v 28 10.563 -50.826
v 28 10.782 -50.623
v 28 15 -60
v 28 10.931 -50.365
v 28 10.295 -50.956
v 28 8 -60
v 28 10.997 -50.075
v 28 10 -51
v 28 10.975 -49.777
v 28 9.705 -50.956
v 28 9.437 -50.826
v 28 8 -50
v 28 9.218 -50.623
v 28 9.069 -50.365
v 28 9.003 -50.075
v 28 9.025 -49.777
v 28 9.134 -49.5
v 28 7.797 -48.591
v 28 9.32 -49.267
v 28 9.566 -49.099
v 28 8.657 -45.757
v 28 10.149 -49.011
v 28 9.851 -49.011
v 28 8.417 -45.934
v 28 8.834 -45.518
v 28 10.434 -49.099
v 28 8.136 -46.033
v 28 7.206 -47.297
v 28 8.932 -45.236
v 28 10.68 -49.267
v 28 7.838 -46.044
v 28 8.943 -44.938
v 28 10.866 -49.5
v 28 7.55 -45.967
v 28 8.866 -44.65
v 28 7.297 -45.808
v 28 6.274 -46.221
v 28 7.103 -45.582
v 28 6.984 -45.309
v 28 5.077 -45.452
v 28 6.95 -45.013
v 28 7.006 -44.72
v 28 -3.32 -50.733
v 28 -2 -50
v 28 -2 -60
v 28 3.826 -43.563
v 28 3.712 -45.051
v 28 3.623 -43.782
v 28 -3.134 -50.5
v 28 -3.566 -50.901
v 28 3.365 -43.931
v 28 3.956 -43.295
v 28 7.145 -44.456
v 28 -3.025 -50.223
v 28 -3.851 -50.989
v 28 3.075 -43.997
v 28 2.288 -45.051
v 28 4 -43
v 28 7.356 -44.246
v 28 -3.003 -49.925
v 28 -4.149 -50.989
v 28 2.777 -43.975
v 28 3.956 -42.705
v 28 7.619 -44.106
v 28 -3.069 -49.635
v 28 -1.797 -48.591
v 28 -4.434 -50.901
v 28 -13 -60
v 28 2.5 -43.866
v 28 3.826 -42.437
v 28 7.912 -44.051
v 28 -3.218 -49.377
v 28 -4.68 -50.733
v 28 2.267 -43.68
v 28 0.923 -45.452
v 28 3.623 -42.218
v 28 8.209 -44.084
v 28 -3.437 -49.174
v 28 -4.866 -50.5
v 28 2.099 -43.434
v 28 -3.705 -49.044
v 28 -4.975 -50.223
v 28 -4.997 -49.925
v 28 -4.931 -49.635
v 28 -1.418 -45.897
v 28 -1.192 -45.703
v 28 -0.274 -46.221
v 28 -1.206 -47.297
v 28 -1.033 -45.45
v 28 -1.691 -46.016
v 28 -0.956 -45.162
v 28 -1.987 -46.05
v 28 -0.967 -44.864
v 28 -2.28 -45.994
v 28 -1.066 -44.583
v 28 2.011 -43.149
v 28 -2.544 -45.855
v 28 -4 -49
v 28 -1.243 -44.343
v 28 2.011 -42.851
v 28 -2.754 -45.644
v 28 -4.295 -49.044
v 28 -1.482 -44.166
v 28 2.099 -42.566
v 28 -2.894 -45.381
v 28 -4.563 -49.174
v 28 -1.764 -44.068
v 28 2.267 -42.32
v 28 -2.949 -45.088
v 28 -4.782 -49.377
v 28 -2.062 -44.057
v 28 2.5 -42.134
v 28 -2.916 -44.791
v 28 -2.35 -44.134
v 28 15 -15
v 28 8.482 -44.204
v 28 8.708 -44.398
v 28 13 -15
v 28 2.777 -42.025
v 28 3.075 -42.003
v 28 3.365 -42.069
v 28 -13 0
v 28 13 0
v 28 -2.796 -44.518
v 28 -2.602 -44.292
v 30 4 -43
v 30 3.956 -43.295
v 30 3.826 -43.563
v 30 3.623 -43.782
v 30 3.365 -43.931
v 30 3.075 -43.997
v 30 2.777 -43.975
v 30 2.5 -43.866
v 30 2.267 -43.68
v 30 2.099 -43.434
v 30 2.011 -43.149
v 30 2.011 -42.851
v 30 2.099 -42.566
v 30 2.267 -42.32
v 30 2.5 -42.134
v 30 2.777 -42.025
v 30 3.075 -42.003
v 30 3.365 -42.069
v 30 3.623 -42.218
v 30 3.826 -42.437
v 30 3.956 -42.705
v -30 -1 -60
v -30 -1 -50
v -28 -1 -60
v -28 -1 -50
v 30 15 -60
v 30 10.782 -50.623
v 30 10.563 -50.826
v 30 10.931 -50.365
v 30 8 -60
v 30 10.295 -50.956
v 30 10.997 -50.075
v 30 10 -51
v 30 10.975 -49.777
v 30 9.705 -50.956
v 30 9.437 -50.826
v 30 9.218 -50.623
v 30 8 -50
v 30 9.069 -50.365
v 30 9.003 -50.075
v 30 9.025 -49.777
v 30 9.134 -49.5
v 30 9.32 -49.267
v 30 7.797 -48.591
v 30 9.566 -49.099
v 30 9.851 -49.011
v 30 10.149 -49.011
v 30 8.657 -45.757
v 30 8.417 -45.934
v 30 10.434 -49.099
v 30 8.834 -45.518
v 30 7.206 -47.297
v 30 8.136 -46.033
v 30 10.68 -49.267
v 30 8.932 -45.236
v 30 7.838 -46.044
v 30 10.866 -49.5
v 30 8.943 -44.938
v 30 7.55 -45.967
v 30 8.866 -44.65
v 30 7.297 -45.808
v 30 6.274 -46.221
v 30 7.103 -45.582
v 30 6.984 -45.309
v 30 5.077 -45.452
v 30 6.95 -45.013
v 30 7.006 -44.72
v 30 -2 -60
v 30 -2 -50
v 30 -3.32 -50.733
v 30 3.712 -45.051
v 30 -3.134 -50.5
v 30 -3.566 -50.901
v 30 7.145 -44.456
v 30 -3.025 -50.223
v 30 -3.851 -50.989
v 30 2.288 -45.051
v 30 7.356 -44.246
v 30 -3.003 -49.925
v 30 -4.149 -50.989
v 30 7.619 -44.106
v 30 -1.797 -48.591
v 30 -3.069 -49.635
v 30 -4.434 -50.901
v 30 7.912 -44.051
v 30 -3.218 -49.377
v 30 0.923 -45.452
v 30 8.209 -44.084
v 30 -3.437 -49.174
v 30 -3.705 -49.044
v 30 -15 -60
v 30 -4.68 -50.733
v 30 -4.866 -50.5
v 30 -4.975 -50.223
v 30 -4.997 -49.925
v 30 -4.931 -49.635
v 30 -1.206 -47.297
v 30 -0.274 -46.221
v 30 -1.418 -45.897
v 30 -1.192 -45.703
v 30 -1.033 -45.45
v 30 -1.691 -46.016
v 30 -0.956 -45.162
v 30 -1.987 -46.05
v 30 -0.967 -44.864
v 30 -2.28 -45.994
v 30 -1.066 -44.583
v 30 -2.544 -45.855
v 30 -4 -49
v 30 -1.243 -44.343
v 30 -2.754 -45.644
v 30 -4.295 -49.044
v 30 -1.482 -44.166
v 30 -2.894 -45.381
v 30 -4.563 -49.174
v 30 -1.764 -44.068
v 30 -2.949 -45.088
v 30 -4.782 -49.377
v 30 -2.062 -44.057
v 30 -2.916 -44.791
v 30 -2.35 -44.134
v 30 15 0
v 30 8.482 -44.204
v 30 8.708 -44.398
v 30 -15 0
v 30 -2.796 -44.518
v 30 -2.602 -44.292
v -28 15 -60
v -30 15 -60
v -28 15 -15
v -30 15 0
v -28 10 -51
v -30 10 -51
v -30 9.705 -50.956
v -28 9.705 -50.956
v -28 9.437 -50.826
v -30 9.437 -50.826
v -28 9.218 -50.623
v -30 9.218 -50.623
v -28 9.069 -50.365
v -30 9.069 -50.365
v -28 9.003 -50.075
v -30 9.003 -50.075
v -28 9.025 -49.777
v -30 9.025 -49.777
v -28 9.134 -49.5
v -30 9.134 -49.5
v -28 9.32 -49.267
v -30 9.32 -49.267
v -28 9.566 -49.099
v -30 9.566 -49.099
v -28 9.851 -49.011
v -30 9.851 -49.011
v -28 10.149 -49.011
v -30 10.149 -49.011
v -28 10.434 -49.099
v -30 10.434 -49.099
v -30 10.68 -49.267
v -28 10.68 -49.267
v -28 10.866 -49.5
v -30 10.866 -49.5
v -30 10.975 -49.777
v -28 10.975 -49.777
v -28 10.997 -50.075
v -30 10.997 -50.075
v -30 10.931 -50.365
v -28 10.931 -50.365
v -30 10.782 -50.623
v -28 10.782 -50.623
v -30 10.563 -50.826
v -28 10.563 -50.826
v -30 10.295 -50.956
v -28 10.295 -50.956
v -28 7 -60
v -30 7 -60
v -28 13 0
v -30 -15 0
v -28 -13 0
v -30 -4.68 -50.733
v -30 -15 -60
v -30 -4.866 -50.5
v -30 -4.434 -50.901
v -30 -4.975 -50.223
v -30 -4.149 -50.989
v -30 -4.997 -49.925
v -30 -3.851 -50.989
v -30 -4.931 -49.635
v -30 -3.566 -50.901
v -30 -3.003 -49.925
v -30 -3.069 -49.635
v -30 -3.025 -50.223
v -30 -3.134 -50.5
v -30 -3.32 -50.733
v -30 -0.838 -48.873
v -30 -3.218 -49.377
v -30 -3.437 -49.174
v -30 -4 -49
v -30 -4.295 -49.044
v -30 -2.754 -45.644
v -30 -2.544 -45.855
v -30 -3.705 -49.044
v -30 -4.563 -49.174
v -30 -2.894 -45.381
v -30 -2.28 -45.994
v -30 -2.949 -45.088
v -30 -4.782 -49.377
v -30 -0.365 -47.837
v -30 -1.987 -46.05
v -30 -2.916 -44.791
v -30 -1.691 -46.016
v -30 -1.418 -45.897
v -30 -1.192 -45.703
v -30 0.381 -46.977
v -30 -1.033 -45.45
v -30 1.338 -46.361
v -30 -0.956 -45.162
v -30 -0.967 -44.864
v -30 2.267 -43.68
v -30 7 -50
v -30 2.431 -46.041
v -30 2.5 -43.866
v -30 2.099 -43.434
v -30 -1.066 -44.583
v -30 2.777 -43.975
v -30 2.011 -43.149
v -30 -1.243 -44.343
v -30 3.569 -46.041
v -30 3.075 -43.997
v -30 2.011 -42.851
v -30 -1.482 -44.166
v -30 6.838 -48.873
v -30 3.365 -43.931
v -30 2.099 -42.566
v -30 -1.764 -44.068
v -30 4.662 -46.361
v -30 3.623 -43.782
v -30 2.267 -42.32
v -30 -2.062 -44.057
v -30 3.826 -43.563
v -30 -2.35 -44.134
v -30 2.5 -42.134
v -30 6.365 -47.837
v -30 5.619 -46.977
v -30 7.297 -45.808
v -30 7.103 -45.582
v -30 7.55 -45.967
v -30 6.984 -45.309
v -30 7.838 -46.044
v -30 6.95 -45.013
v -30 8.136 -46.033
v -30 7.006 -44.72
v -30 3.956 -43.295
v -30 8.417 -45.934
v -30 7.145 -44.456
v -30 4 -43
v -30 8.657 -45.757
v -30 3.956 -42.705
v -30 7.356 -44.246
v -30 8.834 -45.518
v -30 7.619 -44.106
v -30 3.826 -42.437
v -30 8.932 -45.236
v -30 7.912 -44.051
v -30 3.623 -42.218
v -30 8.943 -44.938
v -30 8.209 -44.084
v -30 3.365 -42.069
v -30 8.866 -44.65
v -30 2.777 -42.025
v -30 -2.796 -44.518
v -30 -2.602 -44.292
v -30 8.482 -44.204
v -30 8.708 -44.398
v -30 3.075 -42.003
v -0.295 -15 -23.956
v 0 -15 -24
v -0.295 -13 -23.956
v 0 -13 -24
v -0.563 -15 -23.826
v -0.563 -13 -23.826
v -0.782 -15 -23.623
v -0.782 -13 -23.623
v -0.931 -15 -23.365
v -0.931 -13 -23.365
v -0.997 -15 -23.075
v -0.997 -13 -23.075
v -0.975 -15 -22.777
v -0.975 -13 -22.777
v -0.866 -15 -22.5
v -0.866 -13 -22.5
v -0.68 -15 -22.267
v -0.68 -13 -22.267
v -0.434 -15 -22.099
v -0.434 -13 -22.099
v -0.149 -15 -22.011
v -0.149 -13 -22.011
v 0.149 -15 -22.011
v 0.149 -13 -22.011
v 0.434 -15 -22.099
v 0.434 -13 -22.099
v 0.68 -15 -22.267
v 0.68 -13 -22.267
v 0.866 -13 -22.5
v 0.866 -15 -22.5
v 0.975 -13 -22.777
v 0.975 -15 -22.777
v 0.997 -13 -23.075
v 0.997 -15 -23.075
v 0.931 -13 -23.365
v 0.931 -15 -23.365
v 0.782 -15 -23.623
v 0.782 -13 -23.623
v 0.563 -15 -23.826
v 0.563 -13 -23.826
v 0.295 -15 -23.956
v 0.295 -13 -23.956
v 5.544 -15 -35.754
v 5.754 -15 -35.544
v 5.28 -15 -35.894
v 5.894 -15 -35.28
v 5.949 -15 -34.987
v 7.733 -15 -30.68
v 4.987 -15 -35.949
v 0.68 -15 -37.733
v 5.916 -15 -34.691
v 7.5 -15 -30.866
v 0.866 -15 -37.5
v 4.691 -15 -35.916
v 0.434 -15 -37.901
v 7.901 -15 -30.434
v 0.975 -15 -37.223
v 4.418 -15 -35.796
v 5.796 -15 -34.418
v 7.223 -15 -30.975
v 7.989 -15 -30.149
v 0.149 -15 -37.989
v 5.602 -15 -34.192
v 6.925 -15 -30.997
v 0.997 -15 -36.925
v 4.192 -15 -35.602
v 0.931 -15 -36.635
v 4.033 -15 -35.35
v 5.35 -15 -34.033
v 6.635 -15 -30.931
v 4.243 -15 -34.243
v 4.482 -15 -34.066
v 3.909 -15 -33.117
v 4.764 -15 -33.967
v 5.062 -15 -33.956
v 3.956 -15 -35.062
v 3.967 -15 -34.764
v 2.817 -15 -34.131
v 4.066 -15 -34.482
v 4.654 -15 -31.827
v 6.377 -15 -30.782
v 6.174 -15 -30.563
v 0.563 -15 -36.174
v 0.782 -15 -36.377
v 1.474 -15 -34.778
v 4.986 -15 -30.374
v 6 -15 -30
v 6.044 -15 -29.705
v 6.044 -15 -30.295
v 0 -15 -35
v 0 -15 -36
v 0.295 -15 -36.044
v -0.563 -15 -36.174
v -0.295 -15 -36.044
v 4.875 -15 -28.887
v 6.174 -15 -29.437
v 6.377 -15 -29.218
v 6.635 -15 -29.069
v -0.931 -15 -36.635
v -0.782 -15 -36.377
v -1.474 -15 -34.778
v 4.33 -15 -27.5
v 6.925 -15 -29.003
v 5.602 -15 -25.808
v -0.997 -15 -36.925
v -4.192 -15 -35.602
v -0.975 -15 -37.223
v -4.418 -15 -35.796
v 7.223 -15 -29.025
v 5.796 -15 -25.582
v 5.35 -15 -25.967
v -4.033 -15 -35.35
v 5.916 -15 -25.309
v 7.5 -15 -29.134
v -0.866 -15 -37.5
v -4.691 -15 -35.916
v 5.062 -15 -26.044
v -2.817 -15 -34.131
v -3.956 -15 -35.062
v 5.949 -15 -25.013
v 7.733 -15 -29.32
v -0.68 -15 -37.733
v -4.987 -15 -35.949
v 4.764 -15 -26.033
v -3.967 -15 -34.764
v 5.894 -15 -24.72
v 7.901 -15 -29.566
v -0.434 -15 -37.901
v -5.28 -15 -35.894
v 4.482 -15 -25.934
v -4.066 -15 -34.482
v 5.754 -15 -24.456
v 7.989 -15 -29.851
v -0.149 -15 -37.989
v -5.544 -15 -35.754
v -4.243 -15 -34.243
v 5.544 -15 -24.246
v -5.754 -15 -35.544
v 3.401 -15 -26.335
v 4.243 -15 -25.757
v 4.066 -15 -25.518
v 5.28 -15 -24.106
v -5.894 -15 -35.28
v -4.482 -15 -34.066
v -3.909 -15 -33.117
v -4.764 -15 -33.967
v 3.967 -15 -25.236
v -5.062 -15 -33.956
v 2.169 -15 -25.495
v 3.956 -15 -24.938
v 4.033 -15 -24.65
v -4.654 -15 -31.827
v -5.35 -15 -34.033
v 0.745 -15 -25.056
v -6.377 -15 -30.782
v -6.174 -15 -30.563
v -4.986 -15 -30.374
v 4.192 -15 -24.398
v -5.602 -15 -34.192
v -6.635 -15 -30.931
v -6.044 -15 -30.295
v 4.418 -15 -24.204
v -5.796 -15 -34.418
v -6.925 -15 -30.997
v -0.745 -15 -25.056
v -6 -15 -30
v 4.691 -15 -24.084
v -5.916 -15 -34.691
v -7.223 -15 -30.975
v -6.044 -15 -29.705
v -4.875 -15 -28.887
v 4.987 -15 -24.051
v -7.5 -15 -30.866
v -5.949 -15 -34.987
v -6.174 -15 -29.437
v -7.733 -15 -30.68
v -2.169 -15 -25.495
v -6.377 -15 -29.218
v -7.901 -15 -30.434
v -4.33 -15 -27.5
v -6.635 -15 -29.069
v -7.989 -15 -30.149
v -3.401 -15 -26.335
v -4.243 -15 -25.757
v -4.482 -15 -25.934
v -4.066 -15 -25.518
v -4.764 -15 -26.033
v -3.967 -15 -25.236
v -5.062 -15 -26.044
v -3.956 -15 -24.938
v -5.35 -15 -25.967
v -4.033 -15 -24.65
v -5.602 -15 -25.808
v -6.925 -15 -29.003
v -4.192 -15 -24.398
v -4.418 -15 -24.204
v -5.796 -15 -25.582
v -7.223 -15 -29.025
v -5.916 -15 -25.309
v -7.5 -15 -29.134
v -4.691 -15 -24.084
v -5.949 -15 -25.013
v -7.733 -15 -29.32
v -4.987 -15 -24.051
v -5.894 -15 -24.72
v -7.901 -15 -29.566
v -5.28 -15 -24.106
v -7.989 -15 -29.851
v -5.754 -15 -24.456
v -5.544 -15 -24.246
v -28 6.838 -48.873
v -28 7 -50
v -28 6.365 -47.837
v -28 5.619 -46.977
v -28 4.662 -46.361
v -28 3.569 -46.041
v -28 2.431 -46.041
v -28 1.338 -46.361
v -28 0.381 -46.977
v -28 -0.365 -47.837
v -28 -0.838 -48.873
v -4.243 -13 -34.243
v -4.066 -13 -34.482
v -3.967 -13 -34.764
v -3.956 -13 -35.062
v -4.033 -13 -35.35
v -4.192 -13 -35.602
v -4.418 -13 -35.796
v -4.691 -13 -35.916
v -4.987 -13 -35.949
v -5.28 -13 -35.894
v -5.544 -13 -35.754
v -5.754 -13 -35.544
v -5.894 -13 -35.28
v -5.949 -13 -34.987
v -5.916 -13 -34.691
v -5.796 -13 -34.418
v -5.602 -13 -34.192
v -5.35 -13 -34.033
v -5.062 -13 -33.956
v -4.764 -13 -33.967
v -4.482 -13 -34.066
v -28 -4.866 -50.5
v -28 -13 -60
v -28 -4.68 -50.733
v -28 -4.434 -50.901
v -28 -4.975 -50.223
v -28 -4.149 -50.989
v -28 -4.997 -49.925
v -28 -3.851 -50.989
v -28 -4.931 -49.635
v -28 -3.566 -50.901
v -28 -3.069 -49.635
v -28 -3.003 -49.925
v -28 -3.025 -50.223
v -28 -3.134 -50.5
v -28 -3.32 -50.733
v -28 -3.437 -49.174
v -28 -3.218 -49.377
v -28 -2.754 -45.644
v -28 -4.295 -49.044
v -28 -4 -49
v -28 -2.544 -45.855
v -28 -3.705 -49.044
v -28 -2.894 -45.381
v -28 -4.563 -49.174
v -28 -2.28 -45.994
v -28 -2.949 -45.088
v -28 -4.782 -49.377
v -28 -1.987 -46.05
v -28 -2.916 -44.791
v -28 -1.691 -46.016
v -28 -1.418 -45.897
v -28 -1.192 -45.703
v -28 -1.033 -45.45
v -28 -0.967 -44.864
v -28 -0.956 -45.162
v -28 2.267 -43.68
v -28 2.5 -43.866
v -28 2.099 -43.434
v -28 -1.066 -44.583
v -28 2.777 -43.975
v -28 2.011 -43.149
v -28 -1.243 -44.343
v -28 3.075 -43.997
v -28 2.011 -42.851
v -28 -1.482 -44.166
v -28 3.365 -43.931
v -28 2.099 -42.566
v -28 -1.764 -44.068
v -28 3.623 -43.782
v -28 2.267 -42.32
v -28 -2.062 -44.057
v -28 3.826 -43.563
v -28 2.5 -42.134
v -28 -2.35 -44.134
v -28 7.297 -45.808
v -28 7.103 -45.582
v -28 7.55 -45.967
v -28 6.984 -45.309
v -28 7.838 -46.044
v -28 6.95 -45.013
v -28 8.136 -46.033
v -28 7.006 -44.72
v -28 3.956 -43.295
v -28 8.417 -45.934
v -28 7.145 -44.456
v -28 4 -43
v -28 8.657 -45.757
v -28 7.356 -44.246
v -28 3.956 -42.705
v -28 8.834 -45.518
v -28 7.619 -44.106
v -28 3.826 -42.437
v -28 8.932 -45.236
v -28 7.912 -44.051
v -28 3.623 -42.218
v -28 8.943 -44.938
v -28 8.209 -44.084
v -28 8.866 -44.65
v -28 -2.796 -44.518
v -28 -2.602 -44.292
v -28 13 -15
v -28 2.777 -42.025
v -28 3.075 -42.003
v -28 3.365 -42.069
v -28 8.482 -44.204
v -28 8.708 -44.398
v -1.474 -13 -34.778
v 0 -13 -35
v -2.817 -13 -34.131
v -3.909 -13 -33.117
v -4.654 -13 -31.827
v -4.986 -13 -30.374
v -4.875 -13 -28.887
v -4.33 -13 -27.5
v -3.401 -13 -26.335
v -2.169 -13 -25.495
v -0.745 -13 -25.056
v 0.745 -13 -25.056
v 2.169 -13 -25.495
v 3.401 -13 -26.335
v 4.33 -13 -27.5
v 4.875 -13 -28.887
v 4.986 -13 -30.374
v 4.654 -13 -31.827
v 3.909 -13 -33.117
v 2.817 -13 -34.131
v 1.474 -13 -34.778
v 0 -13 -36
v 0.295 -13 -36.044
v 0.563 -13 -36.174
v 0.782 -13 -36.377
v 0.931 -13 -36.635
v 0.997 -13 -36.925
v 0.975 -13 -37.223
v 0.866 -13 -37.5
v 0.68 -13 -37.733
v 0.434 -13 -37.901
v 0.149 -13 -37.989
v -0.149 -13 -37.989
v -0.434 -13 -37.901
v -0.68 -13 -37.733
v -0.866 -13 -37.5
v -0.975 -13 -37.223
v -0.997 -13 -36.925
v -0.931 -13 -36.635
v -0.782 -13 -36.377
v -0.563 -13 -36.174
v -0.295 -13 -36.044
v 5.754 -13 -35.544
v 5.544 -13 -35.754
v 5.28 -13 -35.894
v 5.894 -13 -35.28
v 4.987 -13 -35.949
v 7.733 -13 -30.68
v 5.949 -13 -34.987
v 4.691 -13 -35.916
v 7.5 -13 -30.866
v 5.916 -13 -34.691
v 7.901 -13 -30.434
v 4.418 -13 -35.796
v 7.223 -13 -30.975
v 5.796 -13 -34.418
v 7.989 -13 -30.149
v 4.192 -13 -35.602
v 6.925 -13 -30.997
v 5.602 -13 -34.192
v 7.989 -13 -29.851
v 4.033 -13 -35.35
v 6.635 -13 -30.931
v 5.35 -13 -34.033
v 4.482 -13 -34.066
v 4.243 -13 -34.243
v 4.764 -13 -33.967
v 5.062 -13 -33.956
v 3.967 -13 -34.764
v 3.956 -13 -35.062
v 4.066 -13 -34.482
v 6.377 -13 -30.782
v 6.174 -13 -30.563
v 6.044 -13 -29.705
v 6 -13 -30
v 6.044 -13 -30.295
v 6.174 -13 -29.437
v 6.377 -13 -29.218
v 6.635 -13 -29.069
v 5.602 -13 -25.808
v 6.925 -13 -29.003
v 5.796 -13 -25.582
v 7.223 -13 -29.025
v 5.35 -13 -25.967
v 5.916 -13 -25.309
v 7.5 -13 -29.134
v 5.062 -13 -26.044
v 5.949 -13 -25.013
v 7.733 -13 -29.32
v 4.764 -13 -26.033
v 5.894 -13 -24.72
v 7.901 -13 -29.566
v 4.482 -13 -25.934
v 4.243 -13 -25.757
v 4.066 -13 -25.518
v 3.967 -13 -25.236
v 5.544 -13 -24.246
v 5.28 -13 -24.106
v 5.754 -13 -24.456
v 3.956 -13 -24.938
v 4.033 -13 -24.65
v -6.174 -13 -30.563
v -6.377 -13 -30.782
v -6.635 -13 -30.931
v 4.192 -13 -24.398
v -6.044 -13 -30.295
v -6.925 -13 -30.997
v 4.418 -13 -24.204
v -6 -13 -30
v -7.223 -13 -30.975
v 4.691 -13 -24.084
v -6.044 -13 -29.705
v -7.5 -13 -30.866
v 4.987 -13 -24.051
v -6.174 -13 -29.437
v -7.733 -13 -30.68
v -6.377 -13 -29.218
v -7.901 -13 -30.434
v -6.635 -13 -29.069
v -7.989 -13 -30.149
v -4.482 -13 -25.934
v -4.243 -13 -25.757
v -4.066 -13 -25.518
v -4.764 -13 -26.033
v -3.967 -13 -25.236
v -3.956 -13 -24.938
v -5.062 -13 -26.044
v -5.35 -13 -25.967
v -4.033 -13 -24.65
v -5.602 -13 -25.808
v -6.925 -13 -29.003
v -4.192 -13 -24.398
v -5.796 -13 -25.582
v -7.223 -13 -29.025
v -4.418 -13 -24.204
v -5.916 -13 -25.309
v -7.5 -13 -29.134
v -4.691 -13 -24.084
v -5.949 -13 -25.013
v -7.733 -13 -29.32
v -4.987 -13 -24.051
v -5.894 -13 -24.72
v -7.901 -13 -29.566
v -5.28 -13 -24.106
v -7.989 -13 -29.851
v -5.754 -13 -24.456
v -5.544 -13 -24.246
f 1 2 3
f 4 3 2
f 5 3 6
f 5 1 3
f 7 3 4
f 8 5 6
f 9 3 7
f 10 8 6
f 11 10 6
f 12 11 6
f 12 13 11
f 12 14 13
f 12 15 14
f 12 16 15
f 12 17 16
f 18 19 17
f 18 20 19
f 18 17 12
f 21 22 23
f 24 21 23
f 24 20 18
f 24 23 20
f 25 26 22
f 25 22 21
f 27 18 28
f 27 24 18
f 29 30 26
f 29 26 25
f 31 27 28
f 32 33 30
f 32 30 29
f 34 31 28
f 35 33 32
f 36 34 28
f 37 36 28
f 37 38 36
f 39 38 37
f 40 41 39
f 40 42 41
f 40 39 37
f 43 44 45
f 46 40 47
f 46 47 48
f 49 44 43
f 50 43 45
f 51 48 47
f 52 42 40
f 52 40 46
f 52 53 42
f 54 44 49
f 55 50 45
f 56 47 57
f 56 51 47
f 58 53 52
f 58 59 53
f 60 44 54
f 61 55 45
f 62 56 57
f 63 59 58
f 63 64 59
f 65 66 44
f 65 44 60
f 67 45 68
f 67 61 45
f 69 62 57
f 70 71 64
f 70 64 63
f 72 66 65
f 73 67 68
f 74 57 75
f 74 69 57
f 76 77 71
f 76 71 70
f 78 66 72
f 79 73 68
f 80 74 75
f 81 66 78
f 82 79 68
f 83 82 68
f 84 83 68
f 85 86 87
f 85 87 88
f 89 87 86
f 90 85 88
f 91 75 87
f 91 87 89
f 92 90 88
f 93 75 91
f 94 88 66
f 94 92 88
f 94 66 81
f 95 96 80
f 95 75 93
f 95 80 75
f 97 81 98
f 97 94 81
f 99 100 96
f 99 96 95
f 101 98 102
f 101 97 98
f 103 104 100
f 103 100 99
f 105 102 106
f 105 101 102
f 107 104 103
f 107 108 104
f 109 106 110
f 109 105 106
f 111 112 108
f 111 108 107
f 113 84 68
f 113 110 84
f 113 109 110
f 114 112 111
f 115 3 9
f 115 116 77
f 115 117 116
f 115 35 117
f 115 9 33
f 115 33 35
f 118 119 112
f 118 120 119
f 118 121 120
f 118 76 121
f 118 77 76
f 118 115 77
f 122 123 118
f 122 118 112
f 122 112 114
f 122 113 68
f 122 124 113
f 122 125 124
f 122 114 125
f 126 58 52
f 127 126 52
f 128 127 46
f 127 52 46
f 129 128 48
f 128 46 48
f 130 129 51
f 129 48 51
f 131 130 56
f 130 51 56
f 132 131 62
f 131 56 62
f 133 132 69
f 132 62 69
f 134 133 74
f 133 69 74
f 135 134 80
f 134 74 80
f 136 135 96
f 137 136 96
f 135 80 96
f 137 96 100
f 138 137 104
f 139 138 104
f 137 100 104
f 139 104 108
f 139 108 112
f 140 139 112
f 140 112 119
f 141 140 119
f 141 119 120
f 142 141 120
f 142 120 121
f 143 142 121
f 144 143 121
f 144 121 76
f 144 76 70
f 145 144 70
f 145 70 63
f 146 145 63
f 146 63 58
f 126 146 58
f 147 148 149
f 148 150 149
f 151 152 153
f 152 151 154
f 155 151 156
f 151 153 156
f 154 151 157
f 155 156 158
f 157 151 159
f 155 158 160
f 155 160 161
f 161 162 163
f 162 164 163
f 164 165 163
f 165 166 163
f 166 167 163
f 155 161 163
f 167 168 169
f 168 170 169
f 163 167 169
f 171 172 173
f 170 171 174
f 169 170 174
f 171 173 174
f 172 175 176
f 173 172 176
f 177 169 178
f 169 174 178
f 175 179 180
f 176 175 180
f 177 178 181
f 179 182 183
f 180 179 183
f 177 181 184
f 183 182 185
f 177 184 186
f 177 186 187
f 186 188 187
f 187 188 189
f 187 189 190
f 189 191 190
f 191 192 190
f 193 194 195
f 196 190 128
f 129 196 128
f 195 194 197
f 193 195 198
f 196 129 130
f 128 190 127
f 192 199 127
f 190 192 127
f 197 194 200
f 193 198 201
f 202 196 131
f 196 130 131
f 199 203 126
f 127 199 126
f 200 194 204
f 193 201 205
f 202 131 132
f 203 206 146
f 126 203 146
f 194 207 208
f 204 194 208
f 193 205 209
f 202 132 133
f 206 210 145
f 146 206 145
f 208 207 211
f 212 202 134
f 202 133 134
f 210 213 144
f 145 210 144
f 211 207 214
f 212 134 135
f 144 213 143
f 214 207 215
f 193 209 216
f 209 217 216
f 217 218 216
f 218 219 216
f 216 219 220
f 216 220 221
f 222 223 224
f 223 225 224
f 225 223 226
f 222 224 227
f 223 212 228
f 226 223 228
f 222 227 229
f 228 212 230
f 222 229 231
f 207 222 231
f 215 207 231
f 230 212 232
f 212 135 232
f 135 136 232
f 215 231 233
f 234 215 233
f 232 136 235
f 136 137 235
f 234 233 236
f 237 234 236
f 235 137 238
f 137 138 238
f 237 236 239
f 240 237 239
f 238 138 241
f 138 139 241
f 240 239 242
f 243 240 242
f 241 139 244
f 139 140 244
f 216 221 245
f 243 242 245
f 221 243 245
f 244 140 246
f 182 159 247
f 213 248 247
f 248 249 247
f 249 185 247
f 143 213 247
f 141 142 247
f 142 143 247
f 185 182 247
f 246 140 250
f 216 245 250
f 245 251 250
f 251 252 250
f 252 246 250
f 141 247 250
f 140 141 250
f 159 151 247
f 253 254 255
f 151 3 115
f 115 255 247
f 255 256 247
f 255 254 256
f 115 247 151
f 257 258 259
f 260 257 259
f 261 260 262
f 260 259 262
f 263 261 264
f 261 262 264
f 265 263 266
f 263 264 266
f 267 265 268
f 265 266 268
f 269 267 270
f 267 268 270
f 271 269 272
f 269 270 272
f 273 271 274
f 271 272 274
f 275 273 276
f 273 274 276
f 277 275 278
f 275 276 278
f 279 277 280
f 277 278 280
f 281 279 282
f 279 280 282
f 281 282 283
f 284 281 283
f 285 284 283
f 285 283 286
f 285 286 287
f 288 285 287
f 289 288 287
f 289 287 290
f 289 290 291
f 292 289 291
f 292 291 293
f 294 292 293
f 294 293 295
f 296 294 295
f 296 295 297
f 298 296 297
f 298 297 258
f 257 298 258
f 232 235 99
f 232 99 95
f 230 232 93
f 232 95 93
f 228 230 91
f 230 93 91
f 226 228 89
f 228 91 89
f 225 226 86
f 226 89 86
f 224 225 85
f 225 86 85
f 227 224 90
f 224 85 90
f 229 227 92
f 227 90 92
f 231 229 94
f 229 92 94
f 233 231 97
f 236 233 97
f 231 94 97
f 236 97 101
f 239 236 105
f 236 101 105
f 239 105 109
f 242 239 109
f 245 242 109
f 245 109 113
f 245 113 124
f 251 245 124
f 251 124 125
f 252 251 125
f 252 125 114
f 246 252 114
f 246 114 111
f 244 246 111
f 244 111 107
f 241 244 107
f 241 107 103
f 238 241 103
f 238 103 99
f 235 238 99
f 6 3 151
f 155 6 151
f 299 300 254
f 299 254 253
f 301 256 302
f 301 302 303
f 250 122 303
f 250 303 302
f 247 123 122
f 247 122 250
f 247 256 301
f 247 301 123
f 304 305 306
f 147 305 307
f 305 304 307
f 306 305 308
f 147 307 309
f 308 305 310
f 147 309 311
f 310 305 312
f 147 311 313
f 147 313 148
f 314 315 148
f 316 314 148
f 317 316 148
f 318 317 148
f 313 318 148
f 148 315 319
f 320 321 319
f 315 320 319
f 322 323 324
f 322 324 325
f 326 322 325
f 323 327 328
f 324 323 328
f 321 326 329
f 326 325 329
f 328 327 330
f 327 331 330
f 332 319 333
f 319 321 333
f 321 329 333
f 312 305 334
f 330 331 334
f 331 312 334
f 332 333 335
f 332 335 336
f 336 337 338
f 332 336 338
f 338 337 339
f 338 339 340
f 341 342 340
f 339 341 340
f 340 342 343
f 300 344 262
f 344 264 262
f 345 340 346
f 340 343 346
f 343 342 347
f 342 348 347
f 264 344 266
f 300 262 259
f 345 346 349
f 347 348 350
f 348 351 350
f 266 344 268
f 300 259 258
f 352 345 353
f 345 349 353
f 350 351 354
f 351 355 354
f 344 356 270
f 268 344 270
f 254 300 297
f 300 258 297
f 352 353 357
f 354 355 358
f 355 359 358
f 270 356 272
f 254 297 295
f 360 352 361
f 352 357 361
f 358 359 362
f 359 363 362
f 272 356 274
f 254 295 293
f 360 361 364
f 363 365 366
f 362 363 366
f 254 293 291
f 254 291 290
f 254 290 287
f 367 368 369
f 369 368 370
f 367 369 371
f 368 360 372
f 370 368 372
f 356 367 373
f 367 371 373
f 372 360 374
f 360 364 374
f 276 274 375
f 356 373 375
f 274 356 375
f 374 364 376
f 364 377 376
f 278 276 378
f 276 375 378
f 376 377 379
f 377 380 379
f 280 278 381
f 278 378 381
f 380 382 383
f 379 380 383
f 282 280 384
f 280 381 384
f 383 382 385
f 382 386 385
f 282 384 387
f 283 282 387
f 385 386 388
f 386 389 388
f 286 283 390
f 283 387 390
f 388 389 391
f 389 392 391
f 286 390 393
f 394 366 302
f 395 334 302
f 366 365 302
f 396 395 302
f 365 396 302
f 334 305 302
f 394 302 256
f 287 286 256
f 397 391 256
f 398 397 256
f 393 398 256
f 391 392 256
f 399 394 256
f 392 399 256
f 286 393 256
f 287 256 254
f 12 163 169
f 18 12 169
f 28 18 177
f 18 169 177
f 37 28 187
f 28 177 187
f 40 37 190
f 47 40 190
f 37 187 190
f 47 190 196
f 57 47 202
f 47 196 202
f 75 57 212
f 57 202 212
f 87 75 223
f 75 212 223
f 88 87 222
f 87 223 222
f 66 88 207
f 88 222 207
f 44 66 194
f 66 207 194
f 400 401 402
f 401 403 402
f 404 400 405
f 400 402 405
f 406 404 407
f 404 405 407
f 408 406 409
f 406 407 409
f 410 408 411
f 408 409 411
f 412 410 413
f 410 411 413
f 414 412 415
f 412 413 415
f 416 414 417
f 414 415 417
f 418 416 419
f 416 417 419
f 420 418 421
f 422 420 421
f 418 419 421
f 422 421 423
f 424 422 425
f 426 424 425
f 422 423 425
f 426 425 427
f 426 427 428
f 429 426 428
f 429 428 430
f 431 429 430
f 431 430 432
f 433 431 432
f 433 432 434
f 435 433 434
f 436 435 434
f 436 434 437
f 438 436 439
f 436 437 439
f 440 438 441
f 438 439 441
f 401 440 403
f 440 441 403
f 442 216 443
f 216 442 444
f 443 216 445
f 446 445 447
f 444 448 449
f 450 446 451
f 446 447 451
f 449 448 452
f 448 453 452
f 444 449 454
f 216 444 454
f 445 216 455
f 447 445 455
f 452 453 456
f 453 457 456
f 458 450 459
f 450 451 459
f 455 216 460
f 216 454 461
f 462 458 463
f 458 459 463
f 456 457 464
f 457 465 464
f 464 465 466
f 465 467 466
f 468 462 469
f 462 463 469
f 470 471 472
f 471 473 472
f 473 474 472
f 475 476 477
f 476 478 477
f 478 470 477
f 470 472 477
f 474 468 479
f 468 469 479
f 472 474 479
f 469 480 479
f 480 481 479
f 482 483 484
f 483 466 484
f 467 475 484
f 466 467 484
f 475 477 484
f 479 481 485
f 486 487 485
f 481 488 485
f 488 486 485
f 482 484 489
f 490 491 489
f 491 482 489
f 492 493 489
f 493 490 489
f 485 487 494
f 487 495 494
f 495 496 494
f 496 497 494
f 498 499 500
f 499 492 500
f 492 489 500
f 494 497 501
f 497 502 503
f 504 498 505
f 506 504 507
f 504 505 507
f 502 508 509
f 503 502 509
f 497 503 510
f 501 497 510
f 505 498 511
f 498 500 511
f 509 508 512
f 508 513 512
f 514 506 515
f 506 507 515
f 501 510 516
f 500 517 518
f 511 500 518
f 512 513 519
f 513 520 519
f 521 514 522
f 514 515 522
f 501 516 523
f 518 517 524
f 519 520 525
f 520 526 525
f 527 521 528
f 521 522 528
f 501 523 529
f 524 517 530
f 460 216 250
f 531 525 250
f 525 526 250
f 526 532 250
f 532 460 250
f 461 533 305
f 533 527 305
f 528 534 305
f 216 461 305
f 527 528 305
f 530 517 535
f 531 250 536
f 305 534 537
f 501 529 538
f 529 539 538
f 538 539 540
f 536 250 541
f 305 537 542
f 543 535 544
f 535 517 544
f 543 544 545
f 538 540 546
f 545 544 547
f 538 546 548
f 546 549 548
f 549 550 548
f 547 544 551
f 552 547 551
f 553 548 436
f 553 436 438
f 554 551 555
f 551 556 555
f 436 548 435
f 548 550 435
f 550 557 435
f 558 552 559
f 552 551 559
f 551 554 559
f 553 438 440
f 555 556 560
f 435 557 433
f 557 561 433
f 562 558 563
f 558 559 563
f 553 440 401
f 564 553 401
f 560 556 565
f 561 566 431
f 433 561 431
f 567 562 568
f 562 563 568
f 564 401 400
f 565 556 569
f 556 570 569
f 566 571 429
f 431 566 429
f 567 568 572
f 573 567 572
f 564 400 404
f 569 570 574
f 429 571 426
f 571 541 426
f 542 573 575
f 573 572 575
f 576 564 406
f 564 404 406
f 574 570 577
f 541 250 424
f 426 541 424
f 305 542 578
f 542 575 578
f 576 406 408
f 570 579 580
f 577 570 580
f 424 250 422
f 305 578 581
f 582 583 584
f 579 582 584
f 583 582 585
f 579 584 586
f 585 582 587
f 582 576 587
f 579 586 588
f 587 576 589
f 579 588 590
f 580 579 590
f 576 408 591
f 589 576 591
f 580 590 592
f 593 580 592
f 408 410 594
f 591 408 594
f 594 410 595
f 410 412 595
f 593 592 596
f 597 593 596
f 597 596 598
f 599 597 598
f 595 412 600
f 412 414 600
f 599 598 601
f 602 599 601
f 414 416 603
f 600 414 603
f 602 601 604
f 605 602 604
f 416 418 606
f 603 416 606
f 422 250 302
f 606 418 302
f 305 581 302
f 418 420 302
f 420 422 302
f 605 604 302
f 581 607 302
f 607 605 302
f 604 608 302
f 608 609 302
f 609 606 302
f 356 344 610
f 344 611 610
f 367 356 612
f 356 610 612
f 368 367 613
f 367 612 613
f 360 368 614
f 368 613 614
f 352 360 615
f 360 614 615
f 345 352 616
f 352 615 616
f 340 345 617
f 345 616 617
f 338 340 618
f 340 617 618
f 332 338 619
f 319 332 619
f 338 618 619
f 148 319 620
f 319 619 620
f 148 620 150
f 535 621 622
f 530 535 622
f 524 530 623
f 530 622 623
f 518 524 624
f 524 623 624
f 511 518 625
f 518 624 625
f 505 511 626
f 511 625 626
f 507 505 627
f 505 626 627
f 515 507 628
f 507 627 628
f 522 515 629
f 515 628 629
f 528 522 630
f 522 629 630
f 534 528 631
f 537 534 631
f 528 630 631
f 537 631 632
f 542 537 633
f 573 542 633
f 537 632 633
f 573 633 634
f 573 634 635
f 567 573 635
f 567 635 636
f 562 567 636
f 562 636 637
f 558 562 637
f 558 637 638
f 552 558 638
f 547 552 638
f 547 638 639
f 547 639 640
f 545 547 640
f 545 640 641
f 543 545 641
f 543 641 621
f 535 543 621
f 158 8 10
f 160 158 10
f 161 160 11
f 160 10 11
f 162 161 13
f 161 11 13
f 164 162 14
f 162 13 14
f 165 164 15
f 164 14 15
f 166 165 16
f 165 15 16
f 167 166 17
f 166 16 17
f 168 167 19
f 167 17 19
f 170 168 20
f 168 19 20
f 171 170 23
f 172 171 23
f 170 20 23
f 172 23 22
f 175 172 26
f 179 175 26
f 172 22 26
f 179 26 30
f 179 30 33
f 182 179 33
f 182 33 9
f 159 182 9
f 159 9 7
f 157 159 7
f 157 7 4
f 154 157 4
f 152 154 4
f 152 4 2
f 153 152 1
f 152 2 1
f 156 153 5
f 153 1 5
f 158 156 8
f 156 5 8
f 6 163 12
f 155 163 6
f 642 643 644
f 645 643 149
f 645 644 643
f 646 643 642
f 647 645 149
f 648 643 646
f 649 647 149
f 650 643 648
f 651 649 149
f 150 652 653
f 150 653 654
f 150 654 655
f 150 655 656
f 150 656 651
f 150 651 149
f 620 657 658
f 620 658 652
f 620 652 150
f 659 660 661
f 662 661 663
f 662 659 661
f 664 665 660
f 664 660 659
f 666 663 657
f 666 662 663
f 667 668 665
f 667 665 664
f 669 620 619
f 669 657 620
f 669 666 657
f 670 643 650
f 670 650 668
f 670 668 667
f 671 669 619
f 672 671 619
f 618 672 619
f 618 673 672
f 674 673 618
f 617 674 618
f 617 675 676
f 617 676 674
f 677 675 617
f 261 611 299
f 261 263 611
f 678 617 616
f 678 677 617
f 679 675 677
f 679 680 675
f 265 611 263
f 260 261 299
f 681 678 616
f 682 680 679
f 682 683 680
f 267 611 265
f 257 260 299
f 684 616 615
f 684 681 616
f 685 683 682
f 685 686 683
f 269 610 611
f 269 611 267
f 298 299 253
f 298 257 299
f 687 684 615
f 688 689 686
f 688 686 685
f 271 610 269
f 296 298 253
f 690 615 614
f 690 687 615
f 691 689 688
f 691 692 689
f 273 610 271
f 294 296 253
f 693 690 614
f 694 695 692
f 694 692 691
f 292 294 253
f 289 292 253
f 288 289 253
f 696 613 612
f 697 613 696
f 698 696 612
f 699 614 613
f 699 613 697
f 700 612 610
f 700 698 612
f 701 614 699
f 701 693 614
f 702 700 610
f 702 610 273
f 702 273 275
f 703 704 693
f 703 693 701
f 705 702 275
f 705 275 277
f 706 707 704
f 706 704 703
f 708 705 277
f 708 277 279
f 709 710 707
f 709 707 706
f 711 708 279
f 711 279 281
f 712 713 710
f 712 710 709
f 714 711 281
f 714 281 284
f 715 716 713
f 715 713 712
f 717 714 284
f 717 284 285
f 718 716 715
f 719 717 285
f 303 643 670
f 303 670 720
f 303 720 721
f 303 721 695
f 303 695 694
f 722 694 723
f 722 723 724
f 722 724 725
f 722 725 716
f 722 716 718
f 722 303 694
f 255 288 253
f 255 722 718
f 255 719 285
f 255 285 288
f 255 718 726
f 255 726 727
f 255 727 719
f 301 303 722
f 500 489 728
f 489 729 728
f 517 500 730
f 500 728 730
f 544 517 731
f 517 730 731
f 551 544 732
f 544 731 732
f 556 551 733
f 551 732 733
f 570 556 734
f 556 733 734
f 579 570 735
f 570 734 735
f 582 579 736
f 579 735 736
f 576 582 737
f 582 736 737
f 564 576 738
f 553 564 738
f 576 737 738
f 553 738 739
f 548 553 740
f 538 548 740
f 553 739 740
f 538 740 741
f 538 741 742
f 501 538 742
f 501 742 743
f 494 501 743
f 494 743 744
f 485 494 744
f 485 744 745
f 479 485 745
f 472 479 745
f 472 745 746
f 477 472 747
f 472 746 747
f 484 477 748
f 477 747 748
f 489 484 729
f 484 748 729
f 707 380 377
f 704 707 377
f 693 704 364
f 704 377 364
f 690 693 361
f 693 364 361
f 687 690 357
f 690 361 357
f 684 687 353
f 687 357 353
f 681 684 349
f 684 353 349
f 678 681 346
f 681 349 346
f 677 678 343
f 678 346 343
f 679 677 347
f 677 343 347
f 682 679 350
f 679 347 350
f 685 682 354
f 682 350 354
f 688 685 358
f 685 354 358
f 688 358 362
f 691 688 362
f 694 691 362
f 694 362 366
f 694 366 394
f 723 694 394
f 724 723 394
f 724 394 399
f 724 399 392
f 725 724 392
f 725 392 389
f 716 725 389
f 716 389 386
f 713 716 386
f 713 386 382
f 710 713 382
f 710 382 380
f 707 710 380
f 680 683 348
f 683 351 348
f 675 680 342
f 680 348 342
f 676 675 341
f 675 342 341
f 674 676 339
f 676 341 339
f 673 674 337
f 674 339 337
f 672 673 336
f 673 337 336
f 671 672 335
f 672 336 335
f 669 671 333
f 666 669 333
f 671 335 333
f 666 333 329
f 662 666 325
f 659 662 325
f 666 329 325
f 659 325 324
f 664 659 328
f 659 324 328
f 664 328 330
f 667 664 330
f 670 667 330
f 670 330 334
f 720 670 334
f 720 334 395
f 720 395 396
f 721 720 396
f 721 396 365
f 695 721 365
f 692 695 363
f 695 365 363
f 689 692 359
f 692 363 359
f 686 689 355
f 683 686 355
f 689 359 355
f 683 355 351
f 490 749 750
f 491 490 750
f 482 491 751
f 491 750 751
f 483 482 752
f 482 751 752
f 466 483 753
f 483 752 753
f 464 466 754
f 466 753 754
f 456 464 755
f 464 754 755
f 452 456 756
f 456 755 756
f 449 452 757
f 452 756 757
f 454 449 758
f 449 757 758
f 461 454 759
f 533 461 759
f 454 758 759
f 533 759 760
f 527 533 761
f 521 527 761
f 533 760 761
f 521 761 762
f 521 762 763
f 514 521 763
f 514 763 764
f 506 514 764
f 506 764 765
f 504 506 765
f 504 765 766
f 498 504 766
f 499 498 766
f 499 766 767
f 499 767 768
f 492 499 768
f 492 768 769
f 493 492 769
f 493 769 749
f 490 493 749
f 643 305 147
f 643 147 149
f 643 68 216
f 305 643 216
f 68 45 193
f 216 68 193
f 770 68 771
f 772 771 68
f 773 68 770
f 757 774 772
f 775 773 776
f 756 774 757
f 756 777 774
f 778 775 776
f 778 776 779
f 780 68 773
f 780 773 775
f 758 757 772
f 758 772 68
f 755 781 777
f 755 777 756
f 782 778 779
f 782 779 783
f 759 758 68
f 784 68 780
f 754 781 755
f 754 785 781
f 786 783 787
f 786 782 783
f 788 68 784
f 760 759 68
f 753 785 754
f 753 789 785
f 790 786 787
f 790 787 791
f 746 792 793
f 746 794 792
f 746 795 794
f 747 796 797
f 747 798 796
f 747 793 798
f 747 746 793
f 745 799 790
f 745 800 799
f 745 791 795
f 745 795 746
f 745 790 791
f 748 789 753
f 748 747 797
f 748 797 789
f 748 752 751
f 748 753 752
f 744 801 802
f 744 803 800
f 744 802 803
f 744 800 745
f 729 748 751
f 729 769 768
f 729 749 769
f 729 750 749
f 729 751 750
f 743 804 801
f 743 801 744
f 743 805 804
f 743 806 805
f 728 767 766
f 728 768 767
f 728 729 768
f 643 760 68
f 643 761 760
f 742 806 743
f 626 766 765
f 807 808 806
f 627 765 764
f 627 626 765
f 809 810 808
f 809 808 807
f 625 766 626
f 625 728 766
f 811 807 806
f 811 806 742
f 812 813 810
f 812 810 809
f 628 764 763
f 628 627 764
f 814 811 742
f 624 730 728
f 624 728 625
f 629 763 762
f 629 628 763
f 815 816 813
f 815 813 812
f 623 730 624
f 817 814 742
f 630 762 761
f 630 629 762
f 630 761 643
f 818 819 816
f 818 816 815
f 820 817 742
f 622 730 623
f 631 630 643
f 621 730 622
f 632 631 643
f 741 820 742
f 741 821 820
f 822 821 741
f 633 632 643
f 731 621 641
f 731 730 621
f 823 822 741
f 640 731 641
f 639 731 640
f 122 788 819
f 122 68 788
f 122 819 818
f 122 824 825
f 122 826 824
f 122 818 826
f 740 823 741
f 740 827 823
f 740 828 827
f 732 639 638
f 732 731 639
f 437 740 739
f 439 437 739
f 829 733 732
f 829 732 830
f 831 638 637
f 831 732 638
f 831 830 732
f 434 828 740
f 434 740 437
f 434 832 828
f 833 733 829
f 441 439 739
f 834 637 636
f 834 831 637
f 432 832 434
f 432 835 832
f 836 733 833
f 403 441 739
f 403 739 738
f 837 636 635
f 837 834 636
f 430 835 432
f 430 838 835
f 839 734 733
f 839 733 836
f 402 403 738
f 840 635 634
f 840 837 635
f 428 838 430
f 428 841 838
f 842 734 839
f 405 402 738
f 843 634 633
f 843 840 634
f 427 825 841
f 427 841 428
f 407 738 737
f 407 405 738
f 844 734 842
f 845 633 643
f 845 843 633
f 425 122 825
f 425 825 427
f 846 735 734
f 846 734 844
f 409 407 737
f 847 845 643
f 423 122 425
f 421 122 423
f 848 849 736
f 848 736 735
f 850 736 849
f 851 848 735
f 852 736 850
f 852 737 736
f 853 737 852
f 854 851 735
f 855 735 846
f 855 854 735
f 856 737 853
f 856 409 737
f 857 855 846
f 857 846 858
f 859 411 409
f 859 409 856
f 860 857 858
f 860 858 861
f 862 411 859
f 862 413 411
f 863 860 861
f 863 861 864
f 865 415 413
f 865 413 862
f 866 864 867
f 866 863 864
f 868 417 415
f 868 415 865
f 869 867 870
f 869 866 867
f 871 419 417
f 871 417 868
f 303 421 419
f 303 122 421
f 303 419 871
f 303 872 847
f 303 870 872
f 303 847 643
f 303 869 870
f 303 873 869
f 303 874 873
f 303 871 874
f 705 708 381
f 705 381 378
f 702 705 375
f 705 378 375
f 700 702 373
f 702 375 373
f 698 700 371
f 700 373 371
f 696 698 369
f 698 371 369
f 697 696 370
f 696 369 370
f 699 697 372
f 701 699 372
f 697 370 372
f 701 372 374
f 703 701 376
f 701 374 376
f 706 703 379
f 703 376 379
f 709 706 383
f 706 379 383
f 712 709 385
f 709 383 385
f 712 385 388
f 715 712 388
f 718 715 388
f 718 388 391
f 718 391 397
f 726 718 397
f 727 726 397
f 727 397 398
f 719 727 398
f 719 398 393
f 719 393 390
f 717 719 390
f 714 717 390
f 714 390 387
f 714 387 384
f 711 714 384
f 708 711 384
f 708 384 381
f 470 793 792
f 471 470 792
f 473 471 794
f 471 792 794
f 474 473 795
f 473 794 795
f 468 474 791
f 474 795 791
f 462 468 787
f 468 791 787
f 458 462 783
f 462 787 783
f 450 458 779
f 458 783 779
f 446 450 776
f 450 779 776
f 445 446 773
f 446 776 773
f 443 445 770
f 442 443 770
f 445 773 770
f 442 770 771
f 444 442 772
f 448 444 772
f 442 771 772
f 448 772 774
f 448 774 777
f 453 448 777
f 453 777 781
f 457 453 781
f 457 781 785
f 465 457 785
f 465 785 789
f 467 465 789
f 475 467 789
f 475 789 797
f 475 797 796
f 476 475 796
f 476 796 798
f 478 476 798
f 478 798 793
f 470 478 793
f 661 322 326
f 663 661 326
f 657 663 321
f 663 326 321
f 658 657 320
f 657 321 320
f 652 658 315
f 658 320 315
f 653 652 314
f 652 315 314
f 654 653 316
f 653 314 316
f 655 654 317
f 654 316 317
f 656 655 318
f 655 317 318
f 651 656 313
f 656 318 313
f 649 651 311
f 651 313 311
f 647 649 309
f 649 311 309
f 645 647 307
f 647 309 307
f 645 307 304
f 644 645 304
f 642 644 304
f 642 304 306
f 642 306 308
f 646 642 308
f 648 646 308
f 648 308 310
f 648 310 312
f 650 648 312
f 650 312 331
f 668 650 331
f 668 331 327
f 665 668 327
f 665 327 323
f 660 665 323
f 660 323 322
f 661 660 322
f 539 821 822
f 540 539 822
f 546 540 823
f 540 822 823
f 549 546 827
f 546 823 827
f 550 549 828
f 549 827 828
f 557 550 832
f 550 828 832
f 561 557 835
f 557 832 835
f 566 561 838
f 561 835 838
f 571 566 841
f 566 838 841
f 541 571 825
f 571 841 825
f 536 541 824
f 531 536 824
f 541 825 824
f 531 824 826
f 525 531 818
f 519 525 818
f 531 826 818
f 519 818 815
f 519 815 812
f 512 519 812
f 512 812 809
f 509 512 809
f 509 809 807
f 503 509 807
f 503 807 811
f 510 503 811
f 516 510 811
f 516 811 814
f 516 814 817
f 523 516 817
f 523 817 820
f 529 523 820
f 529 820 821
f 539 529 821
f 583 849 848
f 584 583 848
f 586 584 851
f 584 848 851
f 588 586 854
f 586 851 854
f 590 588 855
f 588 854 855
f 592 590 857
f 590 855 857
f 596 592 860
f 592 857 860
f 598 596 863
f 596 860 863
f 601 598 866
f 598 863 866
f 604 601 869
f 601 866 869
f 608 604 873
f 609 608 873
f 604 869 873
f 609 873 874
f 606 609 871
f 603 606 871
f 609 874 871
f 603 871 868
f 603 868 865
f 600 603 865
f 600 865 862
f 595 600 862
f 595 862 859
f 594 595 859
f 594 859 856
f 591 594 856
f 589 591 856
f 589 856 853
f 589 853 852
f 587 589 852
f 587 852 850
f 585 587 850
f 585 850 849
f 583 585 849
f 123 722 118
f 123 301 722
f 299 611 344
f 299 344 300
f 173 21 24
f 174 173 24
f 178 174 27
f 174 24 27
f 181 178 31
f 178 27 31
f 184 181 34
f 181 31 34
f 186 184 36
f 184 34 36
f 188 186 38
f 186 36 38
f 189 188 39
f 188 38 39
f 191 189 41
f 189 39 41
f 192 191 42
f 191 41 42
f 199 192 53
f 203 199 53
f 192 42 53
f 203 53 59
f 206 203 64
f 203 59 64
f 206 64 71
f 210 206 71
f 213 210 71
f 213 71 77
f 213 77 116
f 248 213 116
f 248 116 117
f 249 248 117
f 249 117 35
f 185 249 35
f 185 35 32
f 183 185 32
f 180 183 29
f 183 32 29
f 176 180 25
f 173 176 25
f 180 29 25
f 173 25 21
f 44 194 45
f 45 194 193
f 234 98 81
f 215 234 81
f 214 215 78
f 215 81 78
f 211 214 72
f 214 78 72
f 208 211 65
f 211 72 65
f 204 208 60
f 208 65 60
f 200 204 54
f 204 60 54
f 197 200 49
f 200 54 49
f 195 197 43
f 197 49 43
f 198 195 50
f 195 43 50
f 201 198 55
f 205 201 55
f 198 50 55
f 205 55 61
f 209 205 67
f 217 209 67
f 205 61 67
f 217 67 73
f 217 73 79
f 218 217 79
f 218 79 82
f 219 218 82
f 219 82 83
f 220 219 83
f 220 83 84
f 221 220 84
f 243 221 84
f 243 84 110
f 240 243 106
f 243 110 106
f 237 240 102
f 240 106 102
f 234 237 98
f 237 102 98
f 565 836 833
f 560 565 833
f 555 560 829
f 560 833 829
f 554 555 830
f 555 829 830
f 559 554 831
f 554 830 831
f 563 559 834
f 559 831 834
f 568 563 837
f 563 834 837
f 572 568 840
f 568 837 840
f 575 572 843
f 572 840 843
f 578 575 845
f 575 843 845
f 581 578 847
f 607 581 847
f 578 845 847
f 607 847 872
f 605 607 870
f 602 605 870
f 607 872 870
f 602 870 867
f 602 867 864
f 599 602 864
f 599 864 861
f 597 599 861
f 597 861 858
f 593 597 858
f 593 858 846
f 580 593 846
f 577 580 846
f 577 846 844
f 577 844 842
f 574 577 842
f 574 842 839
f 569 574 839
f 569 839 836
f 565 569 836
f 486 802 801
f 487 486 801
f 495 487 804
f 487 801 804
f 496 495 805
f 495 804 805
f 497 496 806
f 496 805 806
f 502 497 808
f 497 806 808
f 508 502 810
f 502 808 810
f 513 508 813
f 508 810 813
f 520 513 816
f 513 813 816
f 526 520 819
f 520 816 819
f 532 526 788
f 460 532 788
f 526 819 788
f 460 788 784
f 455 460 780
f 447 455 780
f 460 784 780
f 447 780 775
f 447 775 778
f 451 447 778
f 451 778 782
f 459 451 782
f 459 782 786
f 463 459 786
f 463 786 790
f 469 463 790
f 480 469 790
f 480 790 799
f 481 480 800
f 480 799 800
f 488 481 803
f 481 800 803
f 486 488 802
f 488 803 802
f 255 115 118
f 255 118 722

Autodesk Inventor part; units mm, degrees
ref_plane "YZ Plane" through (0, 0, 0) normal (1, 0, 0) x (0, 1, 0)
ref_plane "XZ Plane" through (0, 0, 0) normal (0, 1, 0) x (-1, 0, 0)
ref_plane "XY Plane" through (0, 0, 0) normal (0, 0, 1) x (1, 0, 0)
sketch "スケッチ1" plane through (0, 0, 0) normal (0, 0, 1) x (1, 0, 0)
  line L0 (-30, 15) -> (30, 15)
  line L1 (30, 15) -> (30, -15)
  line L2 (30, -15) -> (-30, -15)
  line L3 (-30, -15) -> (-30, 15)
  line L4 (-28, 13) -> (28, 13)
  line L5 (28, 13) -> (28, -13)
  line L6 (28, -13) -> (-28, -13)
  line L7 (-28, -13) -> (-28, 13)
  point P0 (0, 0)
  dimension "d0" = 60
  dimension "d2" = 2
  dimension "d3" = 2
  dimension "d4" = 30
  dimension "d5" = 15
  dimension "d6" = 30
  dimension "d7" = 56
  dimension "d8" = 26
extrude "押し出し1" add sketch "スケッチ1" against normal blind 60
sketch "スケッチ2" plane through (-30, 15, 0) normal (0, 1, 0) x (1, 0, 0)
  line L0 (0, 0) -> (60, 0) projected
  line L1 (60, 0) -> (60, 60) projected
  line L2 (0, 60) -> (60, 60)
  line L3 (60, 60) -> (60, 15)
  line L4 (60, 15) -> (0, 15)
  line L5 (0, 15) -> (0, 60)
  point P0 (30, 0)
  dimension "d11" = 15
extrude "押し出し2" cut sketch "スケッチ2" against normal blind 2
sketch "スケッチ3" plane through (30, -15, 0) normal (1, 0, 0) x (0, 0, -1)
  line L0 (0, 0) -> (60, 0) projected
  line L1 (60, 28) -> (60, 0) projected
  arc A0 (50, 22) -> (50, 14) centre (50, 18) ccw
  line L2 (50, 22) -> (60, 22)
  line L3 (50, 14) -> (60, 14)
  point P0 (0, 15)
  dimension "d14" = 8
  dimension "d16" = 10
  dimension "d17" = 18
extrude "押し出し3" cut sketch "スケッチ3" against normal blind 60
sketch "スケッチ4" plane through (30, -15, 0) normal (1, 0, 0) x (0, 0, -1)
  line L0 (50, 22) -> (60, 22) projected
  line L1 (60, 28) -> (60, 22) projected
  line L2 (60, 14) -> (60, 0) projected
  line L3 (60, 14) -> (50, 14) projected
  arc A0 (50, 22) -> (50, 14) centre (50, 18) ccw projected
  arc A1 (50, 23) -> (50, 13) centre (50, 18) ccw
  line L4 (50, 23) -> (60, 23)
  line L5 (50, 13) -> (60, 13)
  point P0 (0, 15)
  dimension "d20" = 10
extrude "押し出し4" cut sketch "スケッチ4" against normal blind 2
sketch "スケッチ5" plane through (30, -15, 0) normal (1, 0, 0) x (0, 0, -1)
  line L0 (60, 28) -> (60, 23) projected
  arc A0 (50, 23) -> (50, 13) centre (50, 18) ccw projected
  circle A1 centre (50, 25) radius 1
  point P0 (0, 15)
  dimension "d24" = 2
  dimension "d26" = 7
  dimension "d27" = 10
hole "穴1" at (30, 10, -50) direction (-1, 0, 0) diameter 2 end through all
pattern_circular "円形状パターン1" count 5 over 180 about axis through (30, 3, -50) along (1, 0, 0) of "穴1"
sketch "スケッチ6" plane through (-30, -15, 0) normal (0, -1, 0) x (1, 0, 0)
  line L0 (60, 0) -> (0, 0) projected
  line L1 (0, 0) -> (0, -60) projected
  circle A0 centre (30, -30) radius 5
  point P0 (30, 0)
  dimension "d38" = 10
  dimension "d40" = 30
  dimension "d41" = 30
hole "穴2" at (0, -15, -30) direction (0, 1, 0) diameter 10 end through all
sketch "スケッチ7" plane through (-30, -15, 0) normal (0, -1, 0) x (1, 0, 0)
  circle A0 centre (30, -30) radius 5 projected
  line L0 (60, 0) -> (60, -60) projected
  circle A1 centre (30, -23) radius 1
  point P0 (30, 0)
  dimension "d49" = 2
  dimension "d51" = 7
  dimension "d52" = 30
hole "穴3" at (0, -15, -23) direction (0, 1, 0) diameter 2 depth 2 tip angle 118
pattern_circular "円形状パターン2" count 8 over 360 about axis through (0, 75, -30) along (0, -1, 0) of "穴3"
sketch "スケッチ8" plane through (-30, 13, 0) normal (0, 1, 0) x (1, 0, 0)
  line L0 (58, 15) -> (58, 60) projected
  line L1 (60, 15) -> (58, 15) projected
  line L2 (60, 60) -> (60, 15) projected
  line L3 (58, 60) -> (60, 60) projected
  line L4 (0, 60) -> (2, 60)
  line L5 (2, 60) -> (2, 15)
  line L6 (2, 15) -> (0, 15)
  line L7 (0, 15) -> (0, 60)
  line L8 (0, 15) -> (0, 60) projected
  point P0 (30, 0)
  dimension "d64" = 2
  dimension "d66" = 56
  dimension "d67" = 45
  dimension "d68" = 0
extrude "押し出し5" add sketch "スケッチ8" along normal blind 2
properties part number "Arm_Bracket"
